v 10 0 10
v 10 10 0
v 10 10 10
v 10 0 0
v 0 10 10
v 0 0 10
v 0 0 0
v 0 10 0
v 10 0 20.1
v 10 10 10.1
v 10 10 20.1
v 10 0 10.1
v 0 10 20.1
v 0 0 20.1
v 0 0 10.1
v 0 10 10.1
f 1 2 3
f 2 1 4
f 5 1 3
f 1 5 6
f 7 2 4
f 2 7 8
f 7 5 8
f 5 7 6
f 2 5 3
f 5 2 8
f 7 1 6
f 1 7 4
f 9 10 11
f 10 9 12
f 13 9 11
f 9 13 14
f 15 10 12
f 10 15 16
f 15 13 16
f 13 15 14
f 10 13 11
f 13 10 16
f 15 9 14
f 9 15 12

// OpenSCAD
gap = 0.1;

cube(10);
translate([0, 0, 10 + gap]) {
	cube(10);
}
